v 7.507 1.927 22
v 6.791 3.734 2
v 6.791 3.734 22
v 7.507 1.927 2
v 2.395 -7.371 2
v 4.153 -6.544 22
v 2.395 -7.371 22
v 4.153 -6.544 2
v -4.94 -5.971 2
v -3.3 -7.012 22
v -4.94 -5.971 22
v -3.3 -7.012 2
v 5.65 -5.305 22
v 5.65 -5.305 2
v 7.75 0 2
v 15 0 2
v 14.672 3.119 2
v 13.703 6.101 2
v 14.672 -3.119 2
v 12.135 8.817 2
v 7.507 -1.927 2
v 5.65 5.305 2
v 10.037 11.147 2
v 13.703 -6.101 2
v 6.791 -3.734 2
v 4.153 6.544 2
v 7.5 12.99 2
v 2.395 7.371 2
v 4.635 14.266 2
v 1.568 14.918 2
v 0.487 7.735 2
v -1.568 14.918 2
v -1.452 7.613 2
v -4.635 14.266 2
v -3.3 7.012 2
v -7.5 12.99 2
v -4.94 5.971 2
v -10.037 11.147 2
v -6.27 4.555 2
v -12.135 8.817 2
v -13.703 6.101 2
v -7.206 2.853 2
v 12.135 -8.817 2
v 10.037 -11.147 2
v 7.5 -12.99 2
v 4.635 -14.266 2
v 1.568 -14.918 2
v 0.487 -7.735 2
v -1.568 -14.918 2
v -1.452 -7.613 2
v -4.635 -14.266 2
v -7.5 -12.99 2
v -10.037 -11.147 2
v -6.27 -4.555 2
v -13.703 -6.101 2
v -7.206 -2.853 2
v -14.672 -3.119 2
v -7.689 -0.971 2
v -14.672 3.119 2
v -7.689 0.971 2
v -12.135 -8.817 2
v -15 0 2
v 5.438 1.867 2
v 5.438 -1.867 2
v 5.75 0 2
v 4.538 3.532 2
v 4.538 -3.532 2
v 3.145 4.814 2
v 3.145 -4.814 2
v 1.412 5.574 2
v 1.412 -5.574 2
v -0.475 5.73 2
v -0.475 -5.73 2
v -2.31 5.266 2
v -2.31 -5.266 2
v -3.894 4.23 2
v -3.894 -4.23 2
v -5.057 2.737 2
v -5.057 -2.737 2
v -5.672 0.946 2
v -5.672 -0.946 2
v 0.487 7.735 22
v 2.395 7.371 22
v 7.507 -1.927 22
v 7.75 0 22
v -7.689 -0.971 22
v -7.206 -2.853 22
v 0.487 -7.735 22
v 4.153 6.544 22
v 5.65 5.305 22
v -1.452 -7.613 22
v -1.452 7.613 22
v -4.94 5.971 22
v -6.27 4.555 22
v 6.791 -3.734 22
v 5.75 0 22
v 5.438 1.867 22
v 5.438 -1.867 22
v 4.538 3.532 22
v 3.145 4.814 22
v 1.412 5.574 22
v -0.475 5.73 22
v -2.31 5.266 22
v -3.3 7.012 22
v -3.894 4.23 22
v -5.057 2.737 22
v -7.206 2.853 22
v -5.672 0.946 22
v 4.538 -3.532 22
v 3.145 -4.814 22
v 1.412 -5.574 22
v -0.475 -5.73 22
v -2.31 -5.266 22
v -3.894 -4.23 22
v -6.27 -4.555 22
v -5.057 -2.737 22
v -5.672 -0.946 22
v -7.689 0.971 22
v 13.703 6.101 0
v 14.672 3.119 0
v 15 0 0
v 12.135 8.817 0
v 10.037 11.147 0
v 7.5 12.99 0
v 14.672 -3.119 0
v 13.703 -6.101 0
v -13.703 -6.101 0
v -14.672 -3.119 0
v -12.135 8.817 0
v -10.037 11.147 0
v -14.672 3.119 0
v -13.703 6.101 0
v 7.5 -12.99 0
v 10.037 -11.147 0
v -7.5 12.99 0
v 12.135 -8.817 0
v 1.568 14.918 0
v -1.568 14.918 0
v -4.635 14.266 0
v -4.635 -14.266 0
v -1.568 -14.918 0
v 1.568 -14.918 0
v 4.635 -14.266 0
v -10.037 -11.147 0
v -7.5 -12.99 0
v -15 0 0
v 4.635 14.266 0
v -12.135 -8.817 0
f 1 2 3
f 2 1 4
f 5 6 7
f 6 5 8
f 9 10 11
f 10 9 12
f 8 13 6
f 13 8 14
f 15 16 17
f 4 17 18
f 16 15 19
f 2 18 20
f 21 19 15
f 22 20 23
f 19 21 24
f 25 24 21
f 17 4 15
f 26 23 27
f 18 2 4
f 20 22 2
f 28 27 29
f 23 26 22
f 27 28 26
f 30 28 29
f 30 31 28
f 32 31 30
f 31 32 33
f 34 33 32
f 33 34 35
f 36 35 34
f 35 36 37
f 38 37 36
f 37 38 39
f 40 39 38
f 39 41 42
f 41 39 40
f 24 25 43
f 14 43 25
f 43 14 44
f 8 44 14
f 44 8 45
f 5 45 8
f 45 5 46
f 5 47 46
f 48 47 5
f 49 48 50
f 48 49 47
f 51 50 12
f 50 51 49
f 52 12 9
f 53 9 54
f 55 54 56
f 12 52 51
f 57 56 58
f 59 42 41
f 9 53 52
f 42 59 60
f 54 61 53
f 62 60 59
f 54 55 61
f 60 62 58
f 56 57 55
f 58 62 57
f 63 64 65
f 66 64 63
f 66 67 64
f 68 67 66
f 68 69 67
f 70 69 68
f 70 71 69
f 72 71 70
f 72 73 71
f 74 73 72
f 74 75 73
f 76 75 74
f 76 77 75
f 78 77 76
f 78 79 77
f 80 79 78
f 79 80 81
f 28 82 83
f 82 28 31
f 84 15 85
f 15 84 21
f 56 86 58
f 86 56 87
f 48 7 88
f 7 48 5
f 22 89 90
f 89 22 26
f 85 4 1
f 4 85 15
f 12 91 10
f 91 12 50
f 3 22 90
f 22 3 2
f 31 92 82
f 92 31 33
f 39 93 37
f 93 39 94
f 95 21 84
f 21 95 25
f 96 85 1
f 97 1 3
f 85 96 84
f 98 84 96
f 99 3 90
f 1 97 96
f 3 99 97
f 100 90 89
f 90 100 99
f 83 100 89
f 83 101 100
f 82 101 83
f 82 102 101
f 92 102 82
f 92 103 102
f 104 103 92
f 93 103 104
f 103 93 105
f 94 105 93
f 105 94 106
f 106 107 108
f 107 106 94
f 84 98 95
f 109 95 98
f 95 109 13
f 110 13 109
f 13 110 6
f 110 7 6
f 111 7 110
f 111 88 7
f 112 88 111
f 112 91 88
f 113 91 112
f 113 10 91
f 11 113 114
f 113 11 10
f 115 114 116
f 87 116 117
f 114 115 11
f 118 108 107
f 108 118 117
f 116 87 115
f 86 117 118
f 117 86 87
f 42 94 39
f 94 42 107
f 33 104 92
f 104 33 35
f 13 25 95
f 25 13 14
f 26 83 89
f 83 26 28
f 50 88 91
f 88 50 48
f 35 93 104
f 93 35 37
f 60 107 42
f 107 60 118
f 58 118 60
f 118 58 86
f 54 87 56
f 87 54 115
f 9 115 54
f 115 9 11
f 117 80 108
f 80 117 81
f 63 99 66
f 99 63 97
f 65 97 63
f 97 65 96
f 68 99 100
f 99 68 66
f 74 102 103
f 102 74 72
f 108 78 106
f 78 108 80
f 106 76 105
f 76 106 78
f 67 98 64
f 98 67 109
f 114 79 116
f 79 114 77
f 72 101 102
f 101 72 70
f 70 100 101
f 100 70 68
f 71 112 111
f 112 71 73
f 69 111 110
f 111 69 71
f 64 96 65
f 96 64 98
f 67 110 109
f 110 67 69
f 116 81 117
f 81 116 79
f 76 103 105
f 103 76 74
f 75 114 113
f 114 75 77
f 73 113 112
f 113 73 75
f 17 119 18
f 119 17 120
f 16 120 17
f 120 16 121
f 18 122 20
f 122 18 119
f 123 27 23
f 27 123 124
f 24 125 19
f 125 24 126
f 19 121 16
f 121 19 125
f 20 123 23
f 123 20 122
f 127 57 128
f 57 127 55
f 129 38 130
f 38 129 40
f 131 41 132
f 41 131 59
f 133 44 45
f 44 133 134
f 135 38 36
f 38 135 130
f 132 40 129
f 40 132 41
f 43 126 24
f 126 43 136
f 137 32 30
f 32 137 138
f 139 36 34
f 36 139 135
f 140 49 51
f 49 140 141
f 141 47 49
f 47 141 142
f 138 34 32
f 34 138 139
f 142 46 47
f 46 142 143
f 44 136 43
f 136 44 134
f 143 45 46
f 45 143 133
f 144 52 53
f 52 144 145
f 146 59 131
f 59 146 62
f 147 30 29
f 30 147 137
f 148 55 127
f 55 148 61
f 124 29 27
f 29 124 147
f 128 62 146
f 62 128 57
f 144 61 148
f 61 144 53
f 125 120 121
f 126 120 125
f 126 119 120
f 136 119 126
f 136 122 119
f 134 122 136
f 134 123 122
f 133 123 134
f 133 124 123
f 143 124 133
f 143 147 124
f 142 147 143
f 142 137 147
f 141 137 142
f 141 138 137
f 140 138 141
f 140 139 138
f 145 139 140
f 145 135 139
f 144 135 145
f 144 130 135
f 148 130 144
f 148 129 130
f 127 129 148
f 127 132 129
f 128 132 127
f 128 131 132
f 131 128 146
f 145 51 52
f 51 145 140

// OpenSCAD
// Generated by SolidPython 1.1.3 on 2025-05-15 16:58:25


union() {
	cylinder(d = 30.0000000000, h = 2.0000000000);
	difference() {
		translate(v = [0, 0, 2.0000000000]) {
			cylinder(d = 15.5000000000, h = 20.0000000000);
		}
		translate(v = [0, 0, 2.0000000000]) {
			cylinder(d = 11.5000000000, h = 21.0000000000);
		}
	}
}
/***********************************************
*********      SolidPython code:      **********
************************************************
 
#D:\cloud\cloud.blox.media\coden\python\.venv\Scripts\python.exe -m pip install solidpython
# from solid import cylinder, difference, union, scad_render_to_file
from solid import cylinder, difference, union, translate, scad_render_to_file

# Parameter
inner_d = 11.5
outer_d = 15.5
height = 20.0
base_d = 20.0
base_thick = 2.0

# Bodenplatte als Zylinder
base = cylinder(d=base_d, h=base_thick)

# Außenhülse
outer = cylinder(d=outer_d, h=height)

# Innenhohlraum
inner = cylinder(d=inner_d, h=height + 1)  # minimal höher für sauberen Schnitt

# Hohler Zylinder = Außen minus Innen, zuerst translate außen und innen
hollow_cylinder = difference()(
    translate([0, 0, base_thick])(outer),
    translate([0, 0, base_thick])(inner)
)

# Komplett: Boden + hohler Zylinder (oben offen)
model = union()(base, hollow_cylinder)

# Speichern als SCAD-Datei
scad_render_to_file(model, 'sockel_hohl.scad')
print("SCAD-Datei 'sockel_hohl.scad' erzeugt")
 
 
************************************************/
